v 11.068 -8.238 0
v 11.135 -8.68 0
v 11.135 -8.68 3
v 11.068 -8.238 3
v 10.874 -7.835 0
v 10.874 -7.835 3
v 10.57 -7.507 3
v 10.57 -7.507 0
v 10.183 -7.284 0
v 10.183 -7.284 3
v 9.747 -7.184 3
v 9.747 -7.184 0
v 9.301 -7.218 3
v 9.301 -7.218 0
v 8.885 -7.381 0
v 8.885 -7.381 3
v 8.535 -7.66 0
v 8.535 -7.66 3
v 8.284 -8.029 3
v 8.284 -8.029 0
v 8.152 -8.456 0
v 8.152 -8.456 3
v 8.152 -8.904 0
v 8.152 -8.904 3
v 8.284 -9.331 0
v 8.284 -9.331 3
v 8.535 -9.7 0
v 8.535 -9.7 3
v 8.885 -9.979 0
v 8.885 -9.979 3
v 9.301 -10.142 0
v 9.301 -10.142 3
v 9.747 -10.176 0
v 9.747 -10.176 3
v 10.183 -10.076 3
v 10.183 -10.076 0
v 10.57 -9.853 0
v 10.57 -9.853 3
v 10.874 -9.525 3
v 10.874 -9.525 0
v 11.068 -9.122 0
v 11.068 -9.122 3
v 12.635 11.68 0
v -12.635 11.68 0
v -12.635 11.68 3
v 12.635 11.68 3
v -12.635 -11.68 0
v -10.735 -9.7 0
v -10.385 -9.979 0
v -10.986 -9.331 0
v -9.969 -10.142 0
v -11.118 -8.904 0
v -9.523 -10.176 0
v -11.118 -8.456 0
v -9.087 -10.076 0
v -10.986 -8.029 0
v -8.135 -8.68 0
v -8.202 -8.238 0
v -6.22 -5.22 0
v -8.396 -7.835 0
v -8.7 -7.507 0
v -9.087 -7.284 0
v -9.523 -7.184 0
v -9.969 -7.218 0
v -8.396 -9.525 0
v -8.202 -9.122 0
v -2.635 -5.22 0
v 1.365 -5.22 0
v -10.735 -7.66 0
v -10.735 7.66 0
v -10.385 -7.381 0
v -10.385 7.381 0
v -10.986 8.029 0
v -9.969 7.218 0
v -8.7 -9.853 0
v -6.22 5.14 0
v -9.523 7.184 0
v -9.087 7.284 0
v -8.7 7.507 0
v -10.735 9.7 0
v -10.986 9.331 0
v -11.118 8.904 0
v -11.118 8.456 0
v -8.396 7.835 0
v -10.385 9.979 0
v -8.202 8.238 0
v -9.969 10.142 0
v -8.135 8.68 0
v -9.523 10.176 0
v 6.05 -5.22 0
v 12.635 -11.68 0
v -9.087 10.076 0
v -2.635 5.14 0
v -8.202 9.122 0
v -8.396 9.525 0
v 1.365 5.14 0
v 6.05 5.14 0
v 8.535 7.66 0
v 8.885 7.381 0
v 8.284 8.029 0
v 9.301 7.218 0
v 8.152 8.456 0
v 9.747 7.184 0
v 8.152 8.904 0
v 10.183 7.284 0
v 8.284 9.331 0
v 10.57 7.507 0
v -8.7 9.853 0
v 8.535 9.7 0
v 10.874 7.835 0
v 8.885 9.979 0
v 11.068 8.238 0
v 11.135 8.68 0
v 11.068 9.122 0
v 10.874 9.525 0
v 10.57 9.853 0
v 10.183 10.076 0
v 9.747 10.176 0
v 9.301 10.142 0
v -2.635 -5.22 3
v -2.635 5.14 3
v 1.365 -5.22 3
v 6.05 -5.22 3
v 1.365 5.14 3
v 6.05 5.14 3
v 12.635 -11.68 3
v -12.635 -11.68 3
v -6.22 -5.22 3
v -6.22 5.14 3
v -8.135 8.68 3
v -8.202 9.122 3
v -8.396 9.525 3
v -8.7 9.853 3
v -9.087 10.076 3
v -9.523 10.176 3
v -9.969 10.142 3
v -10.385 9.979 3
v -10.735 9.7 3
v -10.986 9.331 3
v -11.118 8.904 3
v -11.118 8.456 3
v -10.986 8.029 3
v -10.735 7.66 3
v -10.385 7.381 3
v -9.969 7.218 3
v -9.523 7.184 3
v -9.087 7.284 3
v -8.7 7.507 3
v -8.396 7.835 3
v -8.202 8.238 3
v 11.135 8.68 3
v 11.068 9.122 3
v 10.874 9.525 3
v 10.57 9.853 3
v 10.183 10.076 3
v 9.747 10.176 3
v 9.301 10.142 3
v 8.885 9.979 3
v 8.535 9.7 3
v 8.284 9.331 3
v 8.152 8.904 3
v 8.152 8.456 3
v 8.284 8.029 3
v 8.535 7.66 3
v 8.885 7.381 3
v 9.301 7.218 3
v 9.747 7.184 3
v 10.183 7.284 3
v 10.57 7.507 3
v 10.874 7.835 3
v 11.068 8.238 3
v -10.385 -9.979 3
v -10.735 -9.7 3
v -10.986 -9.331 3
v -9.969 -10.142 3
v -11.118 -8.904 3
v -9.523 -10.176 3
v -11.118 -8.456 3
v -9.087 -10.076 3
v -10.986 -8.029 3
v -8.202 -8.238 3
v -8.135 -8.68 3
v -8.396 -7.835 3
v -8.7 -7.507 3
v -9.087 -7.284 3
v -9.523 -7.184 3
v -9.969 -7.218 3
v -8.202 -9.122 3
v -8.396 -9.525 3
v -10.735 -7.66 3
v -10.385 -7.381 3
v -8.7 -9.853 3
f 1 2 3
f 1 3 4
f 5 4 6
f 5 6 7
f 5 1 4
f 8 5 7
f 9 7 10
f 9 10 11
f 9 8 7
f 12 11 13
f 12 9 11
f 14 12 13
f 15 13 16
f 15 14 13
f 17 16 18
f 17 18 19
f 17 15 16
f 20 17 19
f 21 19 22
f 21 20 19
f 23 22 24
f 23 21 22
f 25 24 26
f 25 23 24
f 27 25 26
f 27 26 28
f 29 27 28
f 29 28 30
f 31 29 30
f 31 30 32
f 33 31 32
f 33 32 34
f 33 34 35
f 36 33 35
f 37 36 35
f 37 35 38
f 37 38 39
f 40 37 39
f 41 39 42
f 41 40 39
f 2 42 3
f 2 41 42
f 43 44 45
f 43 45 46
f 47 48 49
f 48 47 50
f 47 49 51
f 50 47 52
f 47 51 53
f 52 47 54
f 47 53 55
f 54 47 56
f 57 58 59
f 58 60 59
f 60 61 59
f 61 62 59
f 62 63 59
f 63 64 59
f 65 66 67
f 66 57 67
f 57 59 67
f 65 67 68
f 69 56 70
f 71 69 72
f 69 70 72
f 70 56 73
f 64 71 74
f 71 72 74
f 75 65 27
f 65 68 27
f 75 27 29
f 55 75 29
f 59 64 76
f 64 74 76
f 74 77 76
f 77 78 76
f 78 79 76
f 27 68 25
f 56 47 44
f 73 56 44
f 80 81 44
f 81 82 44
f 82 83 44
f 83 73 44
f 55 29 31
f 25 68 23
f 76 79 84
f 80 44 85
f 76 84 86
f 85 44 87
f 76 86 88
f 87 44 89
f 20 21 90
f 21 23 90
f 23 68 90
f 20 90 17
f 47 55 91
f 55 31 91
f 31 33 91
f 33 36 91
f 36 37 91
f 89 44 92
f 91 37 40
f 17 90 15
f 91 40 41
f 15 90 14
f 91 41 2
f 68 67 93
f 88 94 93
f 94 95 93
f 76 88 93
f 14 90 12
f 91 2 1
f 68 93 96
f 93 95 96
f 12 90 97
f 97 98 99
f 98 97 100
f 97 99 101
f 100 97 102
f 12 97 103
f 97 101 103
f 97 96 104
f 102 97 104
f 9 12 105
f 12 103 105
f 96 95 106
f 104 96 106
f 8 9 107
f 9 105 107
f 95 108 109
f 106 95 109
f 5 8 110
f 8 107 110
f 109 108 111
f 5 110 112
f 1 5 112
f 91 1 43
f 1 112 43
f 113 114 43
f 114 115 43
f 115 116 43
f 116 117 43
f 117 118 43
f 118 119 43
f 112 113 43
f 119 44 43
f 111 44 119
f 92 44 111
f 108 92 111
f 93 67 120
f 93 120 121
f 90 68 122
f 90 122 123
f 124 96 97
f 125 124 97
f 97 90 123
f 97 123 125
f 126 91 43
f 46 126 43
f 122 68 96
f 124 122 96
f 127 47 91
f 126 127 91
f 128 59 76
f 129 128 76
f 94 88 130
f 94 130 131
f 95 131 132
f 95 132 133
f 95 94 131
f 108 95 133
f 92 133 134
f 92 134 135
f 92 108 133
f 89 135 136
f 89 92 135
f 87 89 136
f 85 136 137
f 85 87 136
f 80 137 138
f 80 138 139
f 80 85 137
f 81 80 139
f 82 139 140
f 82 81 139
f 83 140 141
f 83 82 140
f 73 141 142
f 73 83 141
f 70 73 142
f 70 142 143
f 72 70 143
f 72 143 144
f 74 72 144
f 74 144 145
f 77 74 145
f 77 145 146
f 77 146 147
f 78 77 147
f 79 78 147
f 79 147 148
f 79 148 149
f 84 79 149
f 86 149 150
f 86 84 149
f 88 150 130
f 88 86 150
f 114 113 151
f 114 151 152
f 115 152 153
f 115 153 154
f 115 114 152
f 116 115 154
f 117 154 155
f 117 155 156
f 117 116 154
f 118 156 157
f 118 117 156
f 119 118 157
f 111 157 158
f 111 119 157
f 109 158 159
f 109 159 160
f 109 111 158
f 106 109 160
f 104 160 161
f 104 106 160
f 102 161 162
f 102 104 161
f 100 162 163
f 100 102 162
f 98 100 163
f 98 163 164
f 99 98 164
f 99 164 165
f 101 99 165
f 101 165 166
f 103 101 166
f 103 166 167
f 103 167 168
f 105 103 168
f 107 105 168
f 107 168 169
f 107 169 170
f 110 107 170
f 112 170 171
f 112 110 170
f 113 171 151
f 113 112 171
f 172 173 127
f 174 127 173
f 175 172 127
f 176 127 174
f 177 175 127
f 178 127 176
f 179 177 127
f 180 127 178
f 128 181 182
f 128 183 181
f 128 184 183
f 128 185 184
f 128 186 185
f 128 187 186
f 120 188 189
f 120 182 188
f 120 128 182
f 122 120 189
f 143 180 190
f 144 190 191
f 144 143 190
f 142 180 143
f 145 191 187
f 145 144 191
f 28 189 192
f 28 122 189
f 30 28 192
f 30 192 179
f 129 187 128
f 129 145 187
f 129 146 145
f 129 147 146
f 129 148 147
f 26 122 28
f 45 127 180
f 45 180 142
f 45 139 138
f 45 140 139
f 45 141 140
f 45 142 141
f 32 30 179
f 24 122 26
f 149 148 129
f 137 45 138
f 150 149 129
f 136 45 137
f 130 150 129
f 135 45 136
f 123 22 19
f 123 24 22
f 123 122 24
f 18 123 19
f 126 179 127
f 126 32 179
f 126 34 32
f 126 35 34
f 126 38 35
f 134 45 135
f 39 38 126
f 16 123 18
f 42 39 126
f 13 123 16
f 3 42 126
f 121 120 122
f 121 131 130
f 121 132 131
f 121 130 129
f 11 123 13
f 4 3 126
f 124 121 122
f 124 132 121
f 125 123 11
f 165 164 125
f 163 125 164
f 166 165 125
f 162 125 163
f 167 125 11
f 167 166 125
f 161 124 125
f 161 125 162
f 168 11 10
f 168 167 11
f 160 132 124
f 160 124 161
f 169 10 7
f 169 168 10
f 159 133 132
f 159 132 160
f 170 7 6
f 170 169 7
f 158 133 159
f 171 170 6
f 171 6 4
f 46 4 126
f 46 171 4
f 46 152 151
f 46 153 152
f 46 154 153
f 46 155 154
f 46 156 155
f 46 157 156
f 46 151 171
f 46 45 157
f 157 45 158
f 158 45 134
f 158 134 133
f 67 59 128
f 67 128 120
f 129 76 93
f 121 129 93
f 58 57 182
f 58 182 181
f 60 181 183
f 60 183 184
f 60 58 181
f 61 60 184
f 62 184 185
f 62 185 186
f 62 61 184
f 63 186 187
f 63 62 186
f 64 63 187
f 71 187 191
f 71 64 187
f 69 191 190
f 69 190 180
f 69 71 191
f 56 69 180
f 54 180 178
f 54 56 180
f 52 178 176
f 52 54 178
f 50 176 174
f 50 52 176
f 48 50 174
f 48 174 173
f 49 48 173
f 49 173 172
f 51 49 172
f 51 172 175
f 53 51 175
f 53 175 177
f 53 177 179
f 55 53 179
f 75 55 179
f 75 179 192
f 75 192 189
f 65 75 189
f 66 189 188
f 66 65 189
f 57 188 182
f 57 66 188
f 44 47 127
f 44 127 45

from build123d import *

# Parameters (mm, degrees)
SKETCH1_W           = 25.27
SKETCH1_H           = 23.36
SKETCH1_R           = 1.5
SKETCH1_W_2         = 12.27
SKETCH1_H_2         = 10.36
SKETCH1_W_3         = 4
BOSS_EXTRUDE1_DEPTH = 3


with BuildPart() as part:
    # Sketch1 → Boss-Extrude1 (new body)
    # profile 1 of 2: a face of its own
    with BuildSketch(Plane.XY):
        Rectangle(SKETCH1_W, SKETCH1_H)
        with Locations((-9.635, 8.68)):
            Circle(SKETCH1_R, mode=Mode.SUBTRACT)
        with Locations((-9.635, -8.68)):
            Circle(SKETCH1_R, mode=Mode.SUBTRACT)
        with Locations((9.635, -8.68)):
            Circle(SKETCH1_R, mode=Mode.SUBTRACT)
        with Locations((9.635, 8.68)):
            Circle(SKETCH1_R, mode=Mode.SUBTRACT)
        with Locations((-0.085, -0.04)):
            Rectangle(SKETCH1_W_2, SKETCH1_H_2, mode=Mode.SUBTRACT)
    # profile 2 of 2: a face of its own
    with BuildSketch(Plane.XY):
        with Locations((-0.635, -0.04)):
            Rectangle(SKETCH1_W_3, SKETCH1_H_2)
    extrude(amount=BOSS_EXTRUDE1_DEPTH)


solid = part.part
